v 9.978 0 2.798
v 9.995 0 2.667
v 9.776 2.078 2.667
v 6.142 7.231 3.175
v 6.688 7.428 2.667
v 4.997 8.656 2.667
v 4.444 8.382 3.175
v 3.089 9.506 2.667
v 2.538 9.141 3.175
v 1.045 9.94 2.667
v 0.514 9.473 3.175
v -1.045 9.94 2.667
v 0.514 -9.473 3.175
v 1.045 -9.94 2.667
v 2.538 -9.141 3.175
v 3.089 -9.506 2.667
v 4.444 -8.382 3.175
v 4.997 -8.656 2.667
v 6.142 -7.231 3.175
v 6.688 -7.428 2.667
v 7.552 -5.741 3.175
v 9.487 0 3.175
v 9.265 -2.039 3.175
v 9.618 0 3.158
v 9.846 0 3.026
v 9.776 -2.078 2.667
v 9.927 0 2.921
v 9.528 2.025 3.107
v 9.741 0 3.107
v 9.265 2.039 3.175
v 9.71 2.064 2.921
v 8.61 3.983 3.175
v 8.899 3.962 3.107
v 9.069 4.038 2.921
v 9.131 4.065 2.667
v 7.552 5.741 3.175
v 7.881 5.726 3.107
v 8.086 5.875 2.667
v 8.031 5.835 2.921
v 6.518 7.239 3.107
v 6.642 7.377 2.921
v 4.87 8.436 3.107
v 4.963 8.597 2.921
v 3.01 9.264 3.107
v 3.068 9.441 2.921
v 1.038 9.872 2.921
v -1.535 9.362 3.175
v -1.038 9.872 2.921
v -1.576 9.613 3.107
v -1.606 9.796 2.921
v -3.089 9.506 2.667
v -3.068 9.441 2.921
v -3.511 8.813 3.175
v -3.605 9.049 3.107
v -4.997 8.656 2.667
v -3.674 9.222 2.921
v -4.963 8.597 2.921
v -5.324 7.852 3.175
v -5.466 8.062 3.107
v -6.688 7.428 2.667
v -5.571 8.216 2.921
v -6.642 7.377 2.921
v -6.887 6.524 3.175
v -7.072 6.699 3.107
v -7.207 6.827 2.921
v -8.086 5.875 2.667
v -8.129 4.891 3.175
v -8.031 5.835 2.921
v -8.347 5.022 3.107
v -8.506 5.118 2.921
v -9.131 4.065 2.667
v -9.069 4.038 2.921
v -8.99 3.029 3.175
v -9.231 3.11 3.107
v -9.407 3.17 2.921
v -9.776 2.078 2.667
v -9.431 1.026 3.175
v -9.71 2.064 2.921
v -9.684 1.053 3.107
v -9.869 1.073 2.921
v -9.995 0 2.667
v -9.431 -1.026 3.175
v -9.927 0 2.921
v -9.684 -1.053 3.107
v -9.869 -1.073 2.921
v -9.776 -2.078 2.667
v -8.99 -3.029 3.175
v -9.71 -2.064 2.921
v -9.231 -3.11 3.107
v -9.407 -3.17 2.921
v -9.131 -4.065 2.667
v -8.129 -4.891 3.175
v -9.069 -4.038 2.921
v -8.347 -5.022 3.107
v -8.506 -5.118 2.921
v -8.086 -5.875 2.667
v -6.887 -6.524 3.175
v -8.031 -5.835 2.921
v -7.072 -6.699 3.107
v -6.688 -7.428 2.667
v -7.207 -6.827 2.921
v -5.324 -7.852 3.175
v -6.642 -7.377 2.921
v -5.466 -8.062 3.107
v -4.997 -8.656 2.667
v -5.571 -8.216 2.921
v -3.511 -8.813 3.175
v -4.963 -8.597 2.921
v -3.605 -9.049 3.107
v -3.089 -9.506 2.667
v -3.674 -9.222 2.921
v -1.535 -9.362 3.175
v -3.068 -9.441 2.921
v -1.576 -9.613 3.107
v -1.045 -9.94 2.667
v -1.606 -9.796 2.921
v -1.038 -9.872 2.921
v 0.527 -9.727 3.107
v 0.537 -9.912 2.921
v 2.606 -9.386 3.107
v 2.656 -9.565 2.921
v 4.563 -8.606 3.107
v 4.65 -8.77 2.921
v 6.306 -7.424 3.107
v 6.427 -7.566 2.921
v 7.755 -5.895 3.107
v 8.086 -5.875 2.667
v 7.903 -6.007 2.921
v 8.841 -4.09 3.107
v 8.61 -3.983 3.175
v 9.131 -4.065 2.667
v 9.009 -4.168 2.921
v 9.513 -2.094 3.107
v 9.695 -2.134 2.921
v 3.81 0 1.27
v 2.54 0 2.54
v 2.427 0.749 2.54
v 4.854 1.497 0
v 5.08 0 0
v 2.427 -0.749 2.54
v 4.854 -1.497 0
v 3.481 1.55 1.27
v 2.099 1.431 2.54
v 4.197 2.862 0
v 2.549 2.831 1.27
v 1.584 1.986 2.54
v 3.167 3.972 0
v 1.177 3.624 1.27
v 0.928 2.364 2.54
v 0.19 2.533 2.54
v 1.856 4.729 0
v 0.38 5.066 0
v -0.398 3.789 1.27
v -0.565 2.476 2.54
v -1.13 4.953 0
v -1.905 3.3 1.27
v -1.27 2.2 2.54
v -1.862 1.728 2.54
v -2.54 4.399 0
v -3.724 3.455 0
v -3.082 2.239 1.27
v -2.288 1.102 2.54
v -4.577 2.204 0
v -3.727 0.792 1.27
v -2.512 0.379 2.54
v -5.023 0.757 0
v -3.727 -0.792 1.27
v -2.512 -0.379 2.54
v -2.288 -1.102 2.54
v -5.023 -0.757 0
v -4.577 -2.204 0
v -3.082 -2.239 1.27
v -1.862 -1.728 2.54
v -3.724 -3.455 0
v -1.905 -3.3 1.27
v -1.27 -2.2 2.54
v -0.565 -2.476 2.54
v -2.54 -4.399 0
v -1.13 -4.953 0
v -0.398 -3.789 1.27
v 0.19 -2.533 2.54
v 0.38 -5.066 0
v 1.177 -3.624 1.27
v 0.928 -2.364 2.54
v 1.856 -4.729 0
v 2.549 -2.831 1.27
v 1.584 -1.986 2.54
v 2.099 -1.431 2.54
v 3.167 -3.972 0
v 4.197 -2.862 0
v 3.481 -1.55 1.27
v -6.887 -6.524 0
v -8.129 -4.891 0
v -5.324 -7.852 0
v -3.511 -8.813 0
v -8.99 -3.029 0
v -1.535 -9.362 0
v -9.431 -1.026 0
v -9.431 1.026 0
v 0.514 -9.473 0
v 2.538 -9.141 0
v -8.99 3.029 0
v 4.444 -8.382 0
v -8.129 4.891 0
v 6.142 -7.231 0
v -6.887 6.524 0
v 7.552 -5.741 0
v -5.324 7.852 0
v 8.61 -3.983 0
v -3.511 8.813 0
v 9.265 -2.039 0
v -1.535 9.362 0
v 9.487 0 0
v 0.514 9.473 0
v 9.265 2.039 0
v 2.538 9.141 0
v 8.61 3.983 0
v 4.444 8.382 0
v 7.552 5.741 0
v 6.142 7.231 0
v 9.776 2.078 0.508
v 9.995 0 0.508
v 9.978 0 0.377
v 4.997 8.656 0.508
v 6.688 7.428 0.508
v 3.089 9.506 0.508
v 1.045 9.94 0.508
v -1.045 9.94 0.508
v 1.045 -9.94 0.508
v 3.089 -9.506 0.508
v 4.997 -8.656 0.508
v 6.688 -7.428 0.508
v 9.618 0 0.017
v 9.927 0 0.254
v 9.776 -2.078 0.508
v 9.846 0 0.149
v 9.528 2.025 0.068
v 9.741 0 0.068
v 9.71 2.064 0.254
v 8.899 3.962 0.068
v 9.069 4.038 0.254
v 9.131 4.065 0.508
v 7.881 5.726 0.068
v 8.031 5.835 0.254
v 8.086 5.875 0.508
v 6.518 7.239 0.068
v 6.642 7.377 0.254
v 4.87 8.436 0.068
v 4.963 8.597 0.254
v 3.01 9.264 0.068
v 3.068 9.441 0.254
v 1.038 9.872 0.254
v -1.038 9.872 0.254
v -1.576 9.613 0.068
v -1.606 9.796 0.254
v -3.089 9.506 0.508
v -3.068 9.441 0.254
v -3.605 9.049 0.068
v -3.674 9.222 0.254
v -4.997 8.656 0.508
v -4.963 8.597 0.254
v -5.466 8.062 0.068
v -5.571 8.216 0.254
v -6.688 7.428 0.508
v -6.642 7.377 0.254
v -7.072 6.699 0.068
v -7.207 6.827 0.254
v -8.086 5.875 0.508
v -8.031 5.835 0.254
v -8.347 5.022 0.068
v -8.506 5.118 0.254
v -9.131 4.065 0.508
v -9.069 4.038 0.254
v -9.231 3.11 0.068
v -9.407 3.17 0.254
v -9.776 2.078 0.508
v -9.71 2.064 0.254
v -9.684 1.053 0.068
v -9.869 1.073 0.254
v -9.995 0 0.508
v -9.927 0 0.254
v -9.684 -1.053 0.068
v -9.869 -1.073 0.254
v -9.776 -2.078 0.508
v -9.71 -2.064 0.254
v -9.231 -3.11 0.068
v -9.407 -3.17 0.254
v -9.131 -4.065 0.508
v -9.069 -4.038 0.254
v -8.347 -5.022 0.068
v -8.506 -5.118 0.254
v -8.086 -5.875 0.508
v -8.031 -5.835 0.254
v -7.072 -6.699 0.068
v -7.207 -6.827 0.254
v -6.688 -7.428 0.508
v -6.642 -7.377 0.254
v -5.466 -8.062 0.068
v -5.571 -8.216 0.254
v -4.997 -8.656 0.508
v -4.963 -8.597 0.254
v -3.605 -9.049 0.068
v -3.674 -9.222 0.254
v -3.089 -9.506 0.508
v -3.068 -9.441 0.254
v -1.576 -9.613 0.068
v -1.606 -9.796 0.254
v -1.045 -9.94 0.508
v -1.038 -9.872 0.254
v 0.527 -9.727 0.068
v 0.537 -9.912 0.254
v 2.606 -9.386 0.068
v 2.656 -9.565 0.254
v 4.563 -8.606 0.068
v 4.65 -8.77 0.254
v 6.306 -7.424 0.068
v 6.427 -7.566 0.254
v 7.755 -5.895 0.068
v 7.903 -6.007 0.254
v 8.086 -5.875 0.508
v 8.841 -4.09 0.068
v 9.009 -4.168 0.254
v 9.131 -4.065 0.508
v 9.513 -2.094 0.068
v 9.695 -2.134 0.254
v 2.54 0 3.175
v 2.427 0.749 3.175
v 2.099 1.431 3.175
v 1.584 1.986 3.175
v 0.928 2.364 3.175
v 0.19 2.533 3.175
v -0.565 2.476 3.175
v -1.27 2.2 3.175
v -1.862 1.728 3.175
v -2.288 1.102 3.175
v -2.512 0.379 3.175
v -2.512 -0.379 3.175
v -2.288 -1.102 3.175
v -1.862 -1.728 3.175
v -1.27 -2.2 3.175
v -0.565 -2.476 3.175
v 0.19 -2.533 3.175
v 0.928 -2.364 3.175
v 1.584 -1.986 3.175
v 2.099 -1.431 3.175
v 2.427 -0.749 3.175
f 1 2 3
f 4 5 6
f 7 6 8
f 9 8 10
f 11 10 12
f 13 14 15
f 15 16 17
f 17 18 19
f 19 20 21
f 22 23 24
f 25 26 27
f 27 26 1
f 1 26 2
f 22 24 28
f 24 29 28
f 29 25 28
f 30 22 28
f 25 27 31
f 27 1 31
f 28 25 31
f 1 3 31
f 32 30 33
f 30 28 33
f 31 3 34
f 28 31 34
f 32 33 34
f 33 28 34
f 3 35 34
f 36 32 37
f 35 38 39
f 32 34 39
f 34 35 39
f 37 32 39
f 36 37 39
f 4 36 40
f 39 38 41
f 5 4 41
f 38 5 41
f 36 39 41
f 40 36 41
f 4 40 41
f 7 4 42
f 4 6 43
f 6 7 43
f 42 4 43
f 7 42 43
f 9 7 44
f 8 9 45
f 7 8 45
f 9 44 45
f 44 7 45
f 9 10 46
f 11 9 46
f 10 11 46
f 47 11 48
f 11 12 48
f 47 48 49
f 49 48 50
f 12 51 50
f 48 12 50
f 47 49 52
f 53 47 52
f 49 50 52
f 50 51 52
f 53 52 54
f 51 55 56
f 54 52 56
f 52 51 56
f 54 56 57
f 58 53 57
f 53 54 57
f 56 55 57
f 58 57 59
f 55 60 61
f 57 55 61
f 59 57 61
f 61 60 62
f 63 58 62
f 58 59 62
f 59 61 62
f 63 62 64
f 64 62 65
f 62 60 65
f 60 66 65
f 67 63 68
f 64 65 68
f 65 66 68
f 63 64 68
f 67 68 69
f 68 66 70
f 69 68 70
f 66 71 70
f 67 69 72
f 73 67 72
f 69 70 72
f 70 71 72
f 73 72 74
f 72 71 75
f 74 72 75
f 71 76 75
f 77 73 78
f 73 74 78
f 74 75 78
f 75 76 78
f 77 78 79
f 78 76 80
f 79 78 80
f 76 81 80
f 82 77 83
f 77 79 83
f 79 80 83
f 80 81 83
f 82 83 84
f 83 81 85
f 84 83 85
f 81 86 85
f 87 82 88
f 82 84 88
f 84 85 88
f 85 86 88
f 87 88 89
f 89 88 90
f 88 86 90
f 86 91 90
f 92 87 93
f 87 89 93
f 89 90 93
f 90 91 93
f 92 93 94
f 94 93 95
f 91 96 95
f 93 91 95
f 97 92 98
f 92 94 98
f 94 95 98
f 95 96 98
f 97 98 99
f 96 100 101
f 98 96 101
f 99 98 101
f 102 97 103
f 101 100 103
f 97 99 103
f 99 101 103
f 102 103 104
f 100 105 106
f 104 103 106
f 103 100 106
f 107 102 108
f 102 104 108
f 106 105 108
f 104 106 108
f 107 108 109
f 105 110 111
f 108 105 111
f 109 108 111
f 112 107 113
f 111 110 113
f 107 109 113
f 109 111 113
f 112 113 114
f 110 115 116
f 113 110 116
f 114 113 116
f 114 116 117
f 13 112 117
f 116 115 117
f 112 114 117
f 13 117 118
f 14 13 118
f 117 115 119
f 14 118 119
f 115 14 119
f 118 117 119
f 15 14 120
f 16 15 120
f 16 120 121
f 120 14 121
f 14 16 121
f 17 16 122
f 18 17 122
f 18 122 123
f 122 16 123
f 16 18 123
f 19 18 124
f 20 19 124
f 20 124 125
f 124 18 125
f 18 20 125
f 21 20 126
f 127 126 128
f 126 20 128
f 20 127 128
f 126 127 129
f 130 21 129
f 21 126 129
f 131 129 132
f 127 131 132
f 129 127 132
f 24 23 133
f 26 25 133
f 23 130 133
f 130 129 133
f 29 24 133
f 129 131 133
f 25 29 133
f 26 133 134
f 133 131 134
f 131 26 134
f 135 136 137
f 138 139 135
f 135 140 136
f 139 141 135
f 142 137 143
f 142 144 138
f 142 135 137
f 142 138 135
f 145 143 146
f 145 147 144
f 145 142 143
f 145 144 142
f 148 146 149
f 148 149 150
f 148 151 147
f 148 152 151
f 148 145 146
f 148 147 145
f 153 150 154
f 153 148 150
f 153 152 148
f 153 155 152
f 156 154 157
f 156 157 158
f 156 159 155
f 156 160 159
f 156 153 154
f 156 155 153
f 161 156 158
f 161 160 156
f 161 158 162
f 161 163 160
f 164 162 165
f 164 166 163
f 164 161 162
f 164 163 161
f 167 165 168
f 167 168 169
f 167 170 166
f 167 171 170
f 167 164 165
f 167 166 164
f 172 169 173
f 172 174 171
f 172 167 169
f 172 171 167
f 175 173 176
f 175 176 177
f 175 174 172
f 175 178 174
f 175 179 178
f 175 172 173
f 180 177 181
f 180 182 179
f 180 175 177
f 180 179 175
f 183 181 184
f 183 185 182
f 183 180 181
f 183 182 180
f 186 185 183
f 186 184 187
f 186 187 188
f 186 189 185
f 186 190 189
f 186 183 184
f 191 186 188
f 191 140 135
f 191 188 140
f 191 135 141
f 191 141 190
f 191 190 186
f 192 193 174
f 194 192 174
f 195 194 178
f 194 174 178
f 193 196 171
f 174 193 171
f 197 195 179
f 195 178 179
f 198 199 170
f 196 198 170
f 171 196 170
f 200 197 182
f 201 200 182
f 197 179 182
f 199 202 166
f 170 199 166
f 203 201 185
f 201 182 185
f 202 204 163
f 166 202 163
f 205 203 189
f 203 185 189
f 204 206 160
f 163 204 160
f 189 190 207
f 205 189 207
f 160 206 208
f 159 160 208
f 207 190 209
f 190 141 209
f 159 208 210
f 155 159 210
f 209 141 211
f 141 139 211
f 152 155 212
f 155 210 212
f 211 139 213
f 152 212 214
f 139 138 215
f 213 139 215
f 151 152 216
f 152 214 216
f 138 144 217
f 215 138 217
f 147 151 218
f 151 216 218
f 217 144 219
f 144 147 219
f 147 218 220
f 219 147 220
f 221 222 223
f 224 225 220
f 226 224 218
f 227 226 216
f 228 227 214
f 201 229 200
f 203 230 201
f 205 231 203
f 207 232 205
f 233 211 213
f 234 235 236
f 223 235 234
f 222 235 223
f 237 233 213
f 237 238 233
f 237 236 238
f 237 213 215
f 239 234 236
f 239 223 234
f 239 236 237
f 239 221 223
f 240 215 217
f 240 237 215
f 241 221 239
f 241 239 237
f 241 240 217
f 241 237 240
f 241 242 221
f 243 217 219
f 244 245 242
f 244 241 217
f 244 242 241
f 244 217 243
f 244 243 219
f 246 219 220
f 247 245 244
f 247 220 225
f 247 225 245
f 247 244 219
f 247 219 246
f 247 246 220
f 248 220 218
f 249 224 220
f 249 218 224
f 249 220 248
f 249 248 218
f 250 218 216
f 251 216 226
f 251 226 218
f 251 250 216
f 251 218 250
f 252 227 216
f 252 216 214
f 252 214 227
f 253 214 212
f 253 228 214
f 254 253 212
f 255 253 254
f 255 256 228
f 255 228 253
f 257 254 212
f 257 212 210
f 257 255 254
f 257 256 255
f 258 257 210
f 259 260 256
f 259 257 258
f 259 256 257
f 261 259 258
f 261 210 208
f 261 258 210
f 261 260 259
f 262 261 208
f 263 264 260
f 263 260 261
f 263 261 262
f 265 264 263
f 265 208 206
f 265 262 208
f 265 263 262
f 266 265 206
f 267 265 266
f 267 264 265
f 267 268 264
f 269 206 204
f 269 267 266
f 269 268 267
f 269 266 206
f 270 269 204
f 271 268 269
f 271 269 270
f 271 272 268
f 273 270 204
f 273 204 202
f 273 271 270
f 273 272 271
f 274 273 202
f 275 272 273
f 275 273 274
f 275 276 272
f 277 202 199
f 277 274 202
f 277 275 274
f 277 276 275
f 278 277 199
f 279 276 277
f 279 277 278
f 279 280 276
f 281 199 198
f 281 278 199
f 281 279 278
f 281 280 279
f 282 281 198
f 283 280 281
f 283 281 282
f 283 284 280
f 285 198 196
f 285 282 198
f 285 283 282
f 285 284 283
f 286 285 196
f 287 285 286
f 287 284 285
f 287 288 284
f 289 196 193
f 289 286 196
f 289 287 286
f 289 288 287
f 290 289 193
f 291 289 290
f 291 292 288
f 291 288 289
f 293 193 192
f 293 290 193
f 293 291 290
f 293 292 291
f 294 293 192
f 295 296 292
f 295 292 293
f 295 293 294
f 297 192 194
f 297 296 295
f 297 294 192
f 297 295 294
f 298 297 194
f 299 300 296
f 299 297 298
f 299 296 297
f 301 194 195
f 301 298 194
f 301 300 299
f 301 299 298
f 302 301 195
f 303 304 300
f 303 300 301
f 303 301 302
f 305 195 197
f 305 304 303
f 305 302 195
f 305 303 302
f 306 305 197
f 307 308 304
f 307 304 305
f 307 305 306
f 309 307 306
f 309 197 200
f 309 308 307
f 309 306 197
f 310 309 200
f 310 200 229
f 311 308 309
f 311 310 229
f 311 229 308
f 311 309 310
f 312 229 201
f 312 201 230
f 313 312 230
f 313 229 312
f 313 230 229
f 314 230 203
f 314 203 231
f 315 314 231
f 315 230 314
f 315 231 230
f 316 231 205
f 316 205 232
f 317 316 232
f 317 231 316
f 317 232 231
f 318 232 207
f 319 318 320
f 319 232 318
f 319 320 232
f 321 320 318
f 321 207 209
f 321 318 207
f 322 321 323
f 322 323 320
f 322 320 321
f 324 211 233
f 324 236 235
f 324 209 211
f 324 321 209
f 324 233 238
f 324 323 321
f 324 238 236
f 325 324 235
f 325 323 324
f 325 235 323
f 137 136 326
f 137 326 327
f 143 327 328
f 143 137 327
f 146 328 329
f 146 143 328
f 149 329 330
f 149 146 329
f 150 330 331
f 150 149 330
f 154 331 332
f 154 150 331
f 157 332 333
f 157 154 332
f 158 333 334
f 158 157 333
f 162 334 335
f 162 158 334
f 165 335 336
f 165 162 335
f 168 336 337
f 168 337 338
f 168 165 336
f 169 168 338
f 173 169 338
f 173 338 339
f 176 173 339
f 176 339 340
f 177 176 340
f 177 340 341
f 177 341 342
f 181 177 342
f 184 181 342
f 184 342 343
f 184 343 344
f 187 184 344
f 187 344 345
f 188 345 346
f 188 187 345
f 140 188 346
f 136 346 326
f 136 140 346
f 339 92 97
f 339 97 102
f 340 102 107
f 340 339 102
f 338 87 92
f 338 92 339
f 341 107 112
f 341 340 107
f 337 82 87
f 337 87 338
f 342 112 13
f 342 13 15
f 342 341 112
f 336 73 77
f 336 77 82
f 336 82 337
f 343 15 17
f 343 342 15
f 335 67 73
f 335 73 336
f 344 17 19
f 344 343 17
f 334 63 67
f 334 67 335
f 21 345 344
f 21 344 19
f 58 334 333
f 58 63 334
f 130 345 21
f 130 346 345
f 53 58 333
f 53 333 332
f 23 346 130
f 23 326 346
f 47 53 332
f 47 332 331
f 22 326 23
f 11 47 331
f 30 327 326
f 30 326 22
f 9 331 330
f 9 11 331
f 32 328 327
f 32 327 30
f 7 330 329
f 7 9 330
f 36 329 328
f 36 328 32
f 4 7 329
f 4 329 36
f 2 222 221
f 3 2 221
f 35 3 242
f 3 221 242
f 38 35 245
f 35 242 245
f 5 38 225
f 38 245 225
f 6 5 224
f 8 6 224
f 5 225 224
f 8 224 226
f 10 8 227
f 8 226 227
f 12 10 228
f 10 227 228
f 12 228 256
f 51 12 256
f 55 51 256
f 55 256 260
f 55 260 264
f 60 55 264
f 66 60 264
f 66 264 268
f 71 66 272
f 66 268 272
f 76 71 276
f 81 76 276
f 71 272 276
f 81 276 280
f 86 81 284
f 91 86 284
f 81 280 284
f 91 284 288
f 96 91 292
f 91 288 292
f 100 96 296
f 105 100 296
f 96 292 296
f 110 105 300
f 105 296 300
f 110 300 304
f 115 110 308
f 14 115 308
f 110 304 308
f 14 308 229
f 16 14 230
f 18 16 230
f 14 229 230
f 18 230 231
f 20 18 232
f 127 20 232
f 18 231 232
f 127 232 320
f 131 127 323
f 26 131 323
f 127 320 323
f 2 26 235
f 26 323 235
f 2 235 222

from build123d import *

# Parameters (mm, degrees)
F0_R     = 9.9949
F0_R_2   = 2.54
F1_DEPTH = 3.175
F2_SIZE  = 2.54
F3_R     = 0.508


with BuildPart() as f1:
    # F0 (on Top) → F1 (new body)
    with BuildSketch(Plane.XY):
        Circle(F0_R)
        Circle(F0_R_2, mode=Mode.SUBTRACT)
    extrude(amount=F1_DEPTH)

    # F2
    f2_edges = [f1.edges().sort_by_distance(p)[0] for p in [
        (-2.54, 0, 0),
    ]]
    chamfer(f2_edges, length=F2_SIZE)

    # F3
    f3_edges = [f1.edges().sort_by_distance(p)[0] for p in [
        (-9.9949, 0, 3.175),
        (-9.9949, 0, 0),
    ]]
    fillet(f3_edges, radius=F3_R)


solid = f1.part
